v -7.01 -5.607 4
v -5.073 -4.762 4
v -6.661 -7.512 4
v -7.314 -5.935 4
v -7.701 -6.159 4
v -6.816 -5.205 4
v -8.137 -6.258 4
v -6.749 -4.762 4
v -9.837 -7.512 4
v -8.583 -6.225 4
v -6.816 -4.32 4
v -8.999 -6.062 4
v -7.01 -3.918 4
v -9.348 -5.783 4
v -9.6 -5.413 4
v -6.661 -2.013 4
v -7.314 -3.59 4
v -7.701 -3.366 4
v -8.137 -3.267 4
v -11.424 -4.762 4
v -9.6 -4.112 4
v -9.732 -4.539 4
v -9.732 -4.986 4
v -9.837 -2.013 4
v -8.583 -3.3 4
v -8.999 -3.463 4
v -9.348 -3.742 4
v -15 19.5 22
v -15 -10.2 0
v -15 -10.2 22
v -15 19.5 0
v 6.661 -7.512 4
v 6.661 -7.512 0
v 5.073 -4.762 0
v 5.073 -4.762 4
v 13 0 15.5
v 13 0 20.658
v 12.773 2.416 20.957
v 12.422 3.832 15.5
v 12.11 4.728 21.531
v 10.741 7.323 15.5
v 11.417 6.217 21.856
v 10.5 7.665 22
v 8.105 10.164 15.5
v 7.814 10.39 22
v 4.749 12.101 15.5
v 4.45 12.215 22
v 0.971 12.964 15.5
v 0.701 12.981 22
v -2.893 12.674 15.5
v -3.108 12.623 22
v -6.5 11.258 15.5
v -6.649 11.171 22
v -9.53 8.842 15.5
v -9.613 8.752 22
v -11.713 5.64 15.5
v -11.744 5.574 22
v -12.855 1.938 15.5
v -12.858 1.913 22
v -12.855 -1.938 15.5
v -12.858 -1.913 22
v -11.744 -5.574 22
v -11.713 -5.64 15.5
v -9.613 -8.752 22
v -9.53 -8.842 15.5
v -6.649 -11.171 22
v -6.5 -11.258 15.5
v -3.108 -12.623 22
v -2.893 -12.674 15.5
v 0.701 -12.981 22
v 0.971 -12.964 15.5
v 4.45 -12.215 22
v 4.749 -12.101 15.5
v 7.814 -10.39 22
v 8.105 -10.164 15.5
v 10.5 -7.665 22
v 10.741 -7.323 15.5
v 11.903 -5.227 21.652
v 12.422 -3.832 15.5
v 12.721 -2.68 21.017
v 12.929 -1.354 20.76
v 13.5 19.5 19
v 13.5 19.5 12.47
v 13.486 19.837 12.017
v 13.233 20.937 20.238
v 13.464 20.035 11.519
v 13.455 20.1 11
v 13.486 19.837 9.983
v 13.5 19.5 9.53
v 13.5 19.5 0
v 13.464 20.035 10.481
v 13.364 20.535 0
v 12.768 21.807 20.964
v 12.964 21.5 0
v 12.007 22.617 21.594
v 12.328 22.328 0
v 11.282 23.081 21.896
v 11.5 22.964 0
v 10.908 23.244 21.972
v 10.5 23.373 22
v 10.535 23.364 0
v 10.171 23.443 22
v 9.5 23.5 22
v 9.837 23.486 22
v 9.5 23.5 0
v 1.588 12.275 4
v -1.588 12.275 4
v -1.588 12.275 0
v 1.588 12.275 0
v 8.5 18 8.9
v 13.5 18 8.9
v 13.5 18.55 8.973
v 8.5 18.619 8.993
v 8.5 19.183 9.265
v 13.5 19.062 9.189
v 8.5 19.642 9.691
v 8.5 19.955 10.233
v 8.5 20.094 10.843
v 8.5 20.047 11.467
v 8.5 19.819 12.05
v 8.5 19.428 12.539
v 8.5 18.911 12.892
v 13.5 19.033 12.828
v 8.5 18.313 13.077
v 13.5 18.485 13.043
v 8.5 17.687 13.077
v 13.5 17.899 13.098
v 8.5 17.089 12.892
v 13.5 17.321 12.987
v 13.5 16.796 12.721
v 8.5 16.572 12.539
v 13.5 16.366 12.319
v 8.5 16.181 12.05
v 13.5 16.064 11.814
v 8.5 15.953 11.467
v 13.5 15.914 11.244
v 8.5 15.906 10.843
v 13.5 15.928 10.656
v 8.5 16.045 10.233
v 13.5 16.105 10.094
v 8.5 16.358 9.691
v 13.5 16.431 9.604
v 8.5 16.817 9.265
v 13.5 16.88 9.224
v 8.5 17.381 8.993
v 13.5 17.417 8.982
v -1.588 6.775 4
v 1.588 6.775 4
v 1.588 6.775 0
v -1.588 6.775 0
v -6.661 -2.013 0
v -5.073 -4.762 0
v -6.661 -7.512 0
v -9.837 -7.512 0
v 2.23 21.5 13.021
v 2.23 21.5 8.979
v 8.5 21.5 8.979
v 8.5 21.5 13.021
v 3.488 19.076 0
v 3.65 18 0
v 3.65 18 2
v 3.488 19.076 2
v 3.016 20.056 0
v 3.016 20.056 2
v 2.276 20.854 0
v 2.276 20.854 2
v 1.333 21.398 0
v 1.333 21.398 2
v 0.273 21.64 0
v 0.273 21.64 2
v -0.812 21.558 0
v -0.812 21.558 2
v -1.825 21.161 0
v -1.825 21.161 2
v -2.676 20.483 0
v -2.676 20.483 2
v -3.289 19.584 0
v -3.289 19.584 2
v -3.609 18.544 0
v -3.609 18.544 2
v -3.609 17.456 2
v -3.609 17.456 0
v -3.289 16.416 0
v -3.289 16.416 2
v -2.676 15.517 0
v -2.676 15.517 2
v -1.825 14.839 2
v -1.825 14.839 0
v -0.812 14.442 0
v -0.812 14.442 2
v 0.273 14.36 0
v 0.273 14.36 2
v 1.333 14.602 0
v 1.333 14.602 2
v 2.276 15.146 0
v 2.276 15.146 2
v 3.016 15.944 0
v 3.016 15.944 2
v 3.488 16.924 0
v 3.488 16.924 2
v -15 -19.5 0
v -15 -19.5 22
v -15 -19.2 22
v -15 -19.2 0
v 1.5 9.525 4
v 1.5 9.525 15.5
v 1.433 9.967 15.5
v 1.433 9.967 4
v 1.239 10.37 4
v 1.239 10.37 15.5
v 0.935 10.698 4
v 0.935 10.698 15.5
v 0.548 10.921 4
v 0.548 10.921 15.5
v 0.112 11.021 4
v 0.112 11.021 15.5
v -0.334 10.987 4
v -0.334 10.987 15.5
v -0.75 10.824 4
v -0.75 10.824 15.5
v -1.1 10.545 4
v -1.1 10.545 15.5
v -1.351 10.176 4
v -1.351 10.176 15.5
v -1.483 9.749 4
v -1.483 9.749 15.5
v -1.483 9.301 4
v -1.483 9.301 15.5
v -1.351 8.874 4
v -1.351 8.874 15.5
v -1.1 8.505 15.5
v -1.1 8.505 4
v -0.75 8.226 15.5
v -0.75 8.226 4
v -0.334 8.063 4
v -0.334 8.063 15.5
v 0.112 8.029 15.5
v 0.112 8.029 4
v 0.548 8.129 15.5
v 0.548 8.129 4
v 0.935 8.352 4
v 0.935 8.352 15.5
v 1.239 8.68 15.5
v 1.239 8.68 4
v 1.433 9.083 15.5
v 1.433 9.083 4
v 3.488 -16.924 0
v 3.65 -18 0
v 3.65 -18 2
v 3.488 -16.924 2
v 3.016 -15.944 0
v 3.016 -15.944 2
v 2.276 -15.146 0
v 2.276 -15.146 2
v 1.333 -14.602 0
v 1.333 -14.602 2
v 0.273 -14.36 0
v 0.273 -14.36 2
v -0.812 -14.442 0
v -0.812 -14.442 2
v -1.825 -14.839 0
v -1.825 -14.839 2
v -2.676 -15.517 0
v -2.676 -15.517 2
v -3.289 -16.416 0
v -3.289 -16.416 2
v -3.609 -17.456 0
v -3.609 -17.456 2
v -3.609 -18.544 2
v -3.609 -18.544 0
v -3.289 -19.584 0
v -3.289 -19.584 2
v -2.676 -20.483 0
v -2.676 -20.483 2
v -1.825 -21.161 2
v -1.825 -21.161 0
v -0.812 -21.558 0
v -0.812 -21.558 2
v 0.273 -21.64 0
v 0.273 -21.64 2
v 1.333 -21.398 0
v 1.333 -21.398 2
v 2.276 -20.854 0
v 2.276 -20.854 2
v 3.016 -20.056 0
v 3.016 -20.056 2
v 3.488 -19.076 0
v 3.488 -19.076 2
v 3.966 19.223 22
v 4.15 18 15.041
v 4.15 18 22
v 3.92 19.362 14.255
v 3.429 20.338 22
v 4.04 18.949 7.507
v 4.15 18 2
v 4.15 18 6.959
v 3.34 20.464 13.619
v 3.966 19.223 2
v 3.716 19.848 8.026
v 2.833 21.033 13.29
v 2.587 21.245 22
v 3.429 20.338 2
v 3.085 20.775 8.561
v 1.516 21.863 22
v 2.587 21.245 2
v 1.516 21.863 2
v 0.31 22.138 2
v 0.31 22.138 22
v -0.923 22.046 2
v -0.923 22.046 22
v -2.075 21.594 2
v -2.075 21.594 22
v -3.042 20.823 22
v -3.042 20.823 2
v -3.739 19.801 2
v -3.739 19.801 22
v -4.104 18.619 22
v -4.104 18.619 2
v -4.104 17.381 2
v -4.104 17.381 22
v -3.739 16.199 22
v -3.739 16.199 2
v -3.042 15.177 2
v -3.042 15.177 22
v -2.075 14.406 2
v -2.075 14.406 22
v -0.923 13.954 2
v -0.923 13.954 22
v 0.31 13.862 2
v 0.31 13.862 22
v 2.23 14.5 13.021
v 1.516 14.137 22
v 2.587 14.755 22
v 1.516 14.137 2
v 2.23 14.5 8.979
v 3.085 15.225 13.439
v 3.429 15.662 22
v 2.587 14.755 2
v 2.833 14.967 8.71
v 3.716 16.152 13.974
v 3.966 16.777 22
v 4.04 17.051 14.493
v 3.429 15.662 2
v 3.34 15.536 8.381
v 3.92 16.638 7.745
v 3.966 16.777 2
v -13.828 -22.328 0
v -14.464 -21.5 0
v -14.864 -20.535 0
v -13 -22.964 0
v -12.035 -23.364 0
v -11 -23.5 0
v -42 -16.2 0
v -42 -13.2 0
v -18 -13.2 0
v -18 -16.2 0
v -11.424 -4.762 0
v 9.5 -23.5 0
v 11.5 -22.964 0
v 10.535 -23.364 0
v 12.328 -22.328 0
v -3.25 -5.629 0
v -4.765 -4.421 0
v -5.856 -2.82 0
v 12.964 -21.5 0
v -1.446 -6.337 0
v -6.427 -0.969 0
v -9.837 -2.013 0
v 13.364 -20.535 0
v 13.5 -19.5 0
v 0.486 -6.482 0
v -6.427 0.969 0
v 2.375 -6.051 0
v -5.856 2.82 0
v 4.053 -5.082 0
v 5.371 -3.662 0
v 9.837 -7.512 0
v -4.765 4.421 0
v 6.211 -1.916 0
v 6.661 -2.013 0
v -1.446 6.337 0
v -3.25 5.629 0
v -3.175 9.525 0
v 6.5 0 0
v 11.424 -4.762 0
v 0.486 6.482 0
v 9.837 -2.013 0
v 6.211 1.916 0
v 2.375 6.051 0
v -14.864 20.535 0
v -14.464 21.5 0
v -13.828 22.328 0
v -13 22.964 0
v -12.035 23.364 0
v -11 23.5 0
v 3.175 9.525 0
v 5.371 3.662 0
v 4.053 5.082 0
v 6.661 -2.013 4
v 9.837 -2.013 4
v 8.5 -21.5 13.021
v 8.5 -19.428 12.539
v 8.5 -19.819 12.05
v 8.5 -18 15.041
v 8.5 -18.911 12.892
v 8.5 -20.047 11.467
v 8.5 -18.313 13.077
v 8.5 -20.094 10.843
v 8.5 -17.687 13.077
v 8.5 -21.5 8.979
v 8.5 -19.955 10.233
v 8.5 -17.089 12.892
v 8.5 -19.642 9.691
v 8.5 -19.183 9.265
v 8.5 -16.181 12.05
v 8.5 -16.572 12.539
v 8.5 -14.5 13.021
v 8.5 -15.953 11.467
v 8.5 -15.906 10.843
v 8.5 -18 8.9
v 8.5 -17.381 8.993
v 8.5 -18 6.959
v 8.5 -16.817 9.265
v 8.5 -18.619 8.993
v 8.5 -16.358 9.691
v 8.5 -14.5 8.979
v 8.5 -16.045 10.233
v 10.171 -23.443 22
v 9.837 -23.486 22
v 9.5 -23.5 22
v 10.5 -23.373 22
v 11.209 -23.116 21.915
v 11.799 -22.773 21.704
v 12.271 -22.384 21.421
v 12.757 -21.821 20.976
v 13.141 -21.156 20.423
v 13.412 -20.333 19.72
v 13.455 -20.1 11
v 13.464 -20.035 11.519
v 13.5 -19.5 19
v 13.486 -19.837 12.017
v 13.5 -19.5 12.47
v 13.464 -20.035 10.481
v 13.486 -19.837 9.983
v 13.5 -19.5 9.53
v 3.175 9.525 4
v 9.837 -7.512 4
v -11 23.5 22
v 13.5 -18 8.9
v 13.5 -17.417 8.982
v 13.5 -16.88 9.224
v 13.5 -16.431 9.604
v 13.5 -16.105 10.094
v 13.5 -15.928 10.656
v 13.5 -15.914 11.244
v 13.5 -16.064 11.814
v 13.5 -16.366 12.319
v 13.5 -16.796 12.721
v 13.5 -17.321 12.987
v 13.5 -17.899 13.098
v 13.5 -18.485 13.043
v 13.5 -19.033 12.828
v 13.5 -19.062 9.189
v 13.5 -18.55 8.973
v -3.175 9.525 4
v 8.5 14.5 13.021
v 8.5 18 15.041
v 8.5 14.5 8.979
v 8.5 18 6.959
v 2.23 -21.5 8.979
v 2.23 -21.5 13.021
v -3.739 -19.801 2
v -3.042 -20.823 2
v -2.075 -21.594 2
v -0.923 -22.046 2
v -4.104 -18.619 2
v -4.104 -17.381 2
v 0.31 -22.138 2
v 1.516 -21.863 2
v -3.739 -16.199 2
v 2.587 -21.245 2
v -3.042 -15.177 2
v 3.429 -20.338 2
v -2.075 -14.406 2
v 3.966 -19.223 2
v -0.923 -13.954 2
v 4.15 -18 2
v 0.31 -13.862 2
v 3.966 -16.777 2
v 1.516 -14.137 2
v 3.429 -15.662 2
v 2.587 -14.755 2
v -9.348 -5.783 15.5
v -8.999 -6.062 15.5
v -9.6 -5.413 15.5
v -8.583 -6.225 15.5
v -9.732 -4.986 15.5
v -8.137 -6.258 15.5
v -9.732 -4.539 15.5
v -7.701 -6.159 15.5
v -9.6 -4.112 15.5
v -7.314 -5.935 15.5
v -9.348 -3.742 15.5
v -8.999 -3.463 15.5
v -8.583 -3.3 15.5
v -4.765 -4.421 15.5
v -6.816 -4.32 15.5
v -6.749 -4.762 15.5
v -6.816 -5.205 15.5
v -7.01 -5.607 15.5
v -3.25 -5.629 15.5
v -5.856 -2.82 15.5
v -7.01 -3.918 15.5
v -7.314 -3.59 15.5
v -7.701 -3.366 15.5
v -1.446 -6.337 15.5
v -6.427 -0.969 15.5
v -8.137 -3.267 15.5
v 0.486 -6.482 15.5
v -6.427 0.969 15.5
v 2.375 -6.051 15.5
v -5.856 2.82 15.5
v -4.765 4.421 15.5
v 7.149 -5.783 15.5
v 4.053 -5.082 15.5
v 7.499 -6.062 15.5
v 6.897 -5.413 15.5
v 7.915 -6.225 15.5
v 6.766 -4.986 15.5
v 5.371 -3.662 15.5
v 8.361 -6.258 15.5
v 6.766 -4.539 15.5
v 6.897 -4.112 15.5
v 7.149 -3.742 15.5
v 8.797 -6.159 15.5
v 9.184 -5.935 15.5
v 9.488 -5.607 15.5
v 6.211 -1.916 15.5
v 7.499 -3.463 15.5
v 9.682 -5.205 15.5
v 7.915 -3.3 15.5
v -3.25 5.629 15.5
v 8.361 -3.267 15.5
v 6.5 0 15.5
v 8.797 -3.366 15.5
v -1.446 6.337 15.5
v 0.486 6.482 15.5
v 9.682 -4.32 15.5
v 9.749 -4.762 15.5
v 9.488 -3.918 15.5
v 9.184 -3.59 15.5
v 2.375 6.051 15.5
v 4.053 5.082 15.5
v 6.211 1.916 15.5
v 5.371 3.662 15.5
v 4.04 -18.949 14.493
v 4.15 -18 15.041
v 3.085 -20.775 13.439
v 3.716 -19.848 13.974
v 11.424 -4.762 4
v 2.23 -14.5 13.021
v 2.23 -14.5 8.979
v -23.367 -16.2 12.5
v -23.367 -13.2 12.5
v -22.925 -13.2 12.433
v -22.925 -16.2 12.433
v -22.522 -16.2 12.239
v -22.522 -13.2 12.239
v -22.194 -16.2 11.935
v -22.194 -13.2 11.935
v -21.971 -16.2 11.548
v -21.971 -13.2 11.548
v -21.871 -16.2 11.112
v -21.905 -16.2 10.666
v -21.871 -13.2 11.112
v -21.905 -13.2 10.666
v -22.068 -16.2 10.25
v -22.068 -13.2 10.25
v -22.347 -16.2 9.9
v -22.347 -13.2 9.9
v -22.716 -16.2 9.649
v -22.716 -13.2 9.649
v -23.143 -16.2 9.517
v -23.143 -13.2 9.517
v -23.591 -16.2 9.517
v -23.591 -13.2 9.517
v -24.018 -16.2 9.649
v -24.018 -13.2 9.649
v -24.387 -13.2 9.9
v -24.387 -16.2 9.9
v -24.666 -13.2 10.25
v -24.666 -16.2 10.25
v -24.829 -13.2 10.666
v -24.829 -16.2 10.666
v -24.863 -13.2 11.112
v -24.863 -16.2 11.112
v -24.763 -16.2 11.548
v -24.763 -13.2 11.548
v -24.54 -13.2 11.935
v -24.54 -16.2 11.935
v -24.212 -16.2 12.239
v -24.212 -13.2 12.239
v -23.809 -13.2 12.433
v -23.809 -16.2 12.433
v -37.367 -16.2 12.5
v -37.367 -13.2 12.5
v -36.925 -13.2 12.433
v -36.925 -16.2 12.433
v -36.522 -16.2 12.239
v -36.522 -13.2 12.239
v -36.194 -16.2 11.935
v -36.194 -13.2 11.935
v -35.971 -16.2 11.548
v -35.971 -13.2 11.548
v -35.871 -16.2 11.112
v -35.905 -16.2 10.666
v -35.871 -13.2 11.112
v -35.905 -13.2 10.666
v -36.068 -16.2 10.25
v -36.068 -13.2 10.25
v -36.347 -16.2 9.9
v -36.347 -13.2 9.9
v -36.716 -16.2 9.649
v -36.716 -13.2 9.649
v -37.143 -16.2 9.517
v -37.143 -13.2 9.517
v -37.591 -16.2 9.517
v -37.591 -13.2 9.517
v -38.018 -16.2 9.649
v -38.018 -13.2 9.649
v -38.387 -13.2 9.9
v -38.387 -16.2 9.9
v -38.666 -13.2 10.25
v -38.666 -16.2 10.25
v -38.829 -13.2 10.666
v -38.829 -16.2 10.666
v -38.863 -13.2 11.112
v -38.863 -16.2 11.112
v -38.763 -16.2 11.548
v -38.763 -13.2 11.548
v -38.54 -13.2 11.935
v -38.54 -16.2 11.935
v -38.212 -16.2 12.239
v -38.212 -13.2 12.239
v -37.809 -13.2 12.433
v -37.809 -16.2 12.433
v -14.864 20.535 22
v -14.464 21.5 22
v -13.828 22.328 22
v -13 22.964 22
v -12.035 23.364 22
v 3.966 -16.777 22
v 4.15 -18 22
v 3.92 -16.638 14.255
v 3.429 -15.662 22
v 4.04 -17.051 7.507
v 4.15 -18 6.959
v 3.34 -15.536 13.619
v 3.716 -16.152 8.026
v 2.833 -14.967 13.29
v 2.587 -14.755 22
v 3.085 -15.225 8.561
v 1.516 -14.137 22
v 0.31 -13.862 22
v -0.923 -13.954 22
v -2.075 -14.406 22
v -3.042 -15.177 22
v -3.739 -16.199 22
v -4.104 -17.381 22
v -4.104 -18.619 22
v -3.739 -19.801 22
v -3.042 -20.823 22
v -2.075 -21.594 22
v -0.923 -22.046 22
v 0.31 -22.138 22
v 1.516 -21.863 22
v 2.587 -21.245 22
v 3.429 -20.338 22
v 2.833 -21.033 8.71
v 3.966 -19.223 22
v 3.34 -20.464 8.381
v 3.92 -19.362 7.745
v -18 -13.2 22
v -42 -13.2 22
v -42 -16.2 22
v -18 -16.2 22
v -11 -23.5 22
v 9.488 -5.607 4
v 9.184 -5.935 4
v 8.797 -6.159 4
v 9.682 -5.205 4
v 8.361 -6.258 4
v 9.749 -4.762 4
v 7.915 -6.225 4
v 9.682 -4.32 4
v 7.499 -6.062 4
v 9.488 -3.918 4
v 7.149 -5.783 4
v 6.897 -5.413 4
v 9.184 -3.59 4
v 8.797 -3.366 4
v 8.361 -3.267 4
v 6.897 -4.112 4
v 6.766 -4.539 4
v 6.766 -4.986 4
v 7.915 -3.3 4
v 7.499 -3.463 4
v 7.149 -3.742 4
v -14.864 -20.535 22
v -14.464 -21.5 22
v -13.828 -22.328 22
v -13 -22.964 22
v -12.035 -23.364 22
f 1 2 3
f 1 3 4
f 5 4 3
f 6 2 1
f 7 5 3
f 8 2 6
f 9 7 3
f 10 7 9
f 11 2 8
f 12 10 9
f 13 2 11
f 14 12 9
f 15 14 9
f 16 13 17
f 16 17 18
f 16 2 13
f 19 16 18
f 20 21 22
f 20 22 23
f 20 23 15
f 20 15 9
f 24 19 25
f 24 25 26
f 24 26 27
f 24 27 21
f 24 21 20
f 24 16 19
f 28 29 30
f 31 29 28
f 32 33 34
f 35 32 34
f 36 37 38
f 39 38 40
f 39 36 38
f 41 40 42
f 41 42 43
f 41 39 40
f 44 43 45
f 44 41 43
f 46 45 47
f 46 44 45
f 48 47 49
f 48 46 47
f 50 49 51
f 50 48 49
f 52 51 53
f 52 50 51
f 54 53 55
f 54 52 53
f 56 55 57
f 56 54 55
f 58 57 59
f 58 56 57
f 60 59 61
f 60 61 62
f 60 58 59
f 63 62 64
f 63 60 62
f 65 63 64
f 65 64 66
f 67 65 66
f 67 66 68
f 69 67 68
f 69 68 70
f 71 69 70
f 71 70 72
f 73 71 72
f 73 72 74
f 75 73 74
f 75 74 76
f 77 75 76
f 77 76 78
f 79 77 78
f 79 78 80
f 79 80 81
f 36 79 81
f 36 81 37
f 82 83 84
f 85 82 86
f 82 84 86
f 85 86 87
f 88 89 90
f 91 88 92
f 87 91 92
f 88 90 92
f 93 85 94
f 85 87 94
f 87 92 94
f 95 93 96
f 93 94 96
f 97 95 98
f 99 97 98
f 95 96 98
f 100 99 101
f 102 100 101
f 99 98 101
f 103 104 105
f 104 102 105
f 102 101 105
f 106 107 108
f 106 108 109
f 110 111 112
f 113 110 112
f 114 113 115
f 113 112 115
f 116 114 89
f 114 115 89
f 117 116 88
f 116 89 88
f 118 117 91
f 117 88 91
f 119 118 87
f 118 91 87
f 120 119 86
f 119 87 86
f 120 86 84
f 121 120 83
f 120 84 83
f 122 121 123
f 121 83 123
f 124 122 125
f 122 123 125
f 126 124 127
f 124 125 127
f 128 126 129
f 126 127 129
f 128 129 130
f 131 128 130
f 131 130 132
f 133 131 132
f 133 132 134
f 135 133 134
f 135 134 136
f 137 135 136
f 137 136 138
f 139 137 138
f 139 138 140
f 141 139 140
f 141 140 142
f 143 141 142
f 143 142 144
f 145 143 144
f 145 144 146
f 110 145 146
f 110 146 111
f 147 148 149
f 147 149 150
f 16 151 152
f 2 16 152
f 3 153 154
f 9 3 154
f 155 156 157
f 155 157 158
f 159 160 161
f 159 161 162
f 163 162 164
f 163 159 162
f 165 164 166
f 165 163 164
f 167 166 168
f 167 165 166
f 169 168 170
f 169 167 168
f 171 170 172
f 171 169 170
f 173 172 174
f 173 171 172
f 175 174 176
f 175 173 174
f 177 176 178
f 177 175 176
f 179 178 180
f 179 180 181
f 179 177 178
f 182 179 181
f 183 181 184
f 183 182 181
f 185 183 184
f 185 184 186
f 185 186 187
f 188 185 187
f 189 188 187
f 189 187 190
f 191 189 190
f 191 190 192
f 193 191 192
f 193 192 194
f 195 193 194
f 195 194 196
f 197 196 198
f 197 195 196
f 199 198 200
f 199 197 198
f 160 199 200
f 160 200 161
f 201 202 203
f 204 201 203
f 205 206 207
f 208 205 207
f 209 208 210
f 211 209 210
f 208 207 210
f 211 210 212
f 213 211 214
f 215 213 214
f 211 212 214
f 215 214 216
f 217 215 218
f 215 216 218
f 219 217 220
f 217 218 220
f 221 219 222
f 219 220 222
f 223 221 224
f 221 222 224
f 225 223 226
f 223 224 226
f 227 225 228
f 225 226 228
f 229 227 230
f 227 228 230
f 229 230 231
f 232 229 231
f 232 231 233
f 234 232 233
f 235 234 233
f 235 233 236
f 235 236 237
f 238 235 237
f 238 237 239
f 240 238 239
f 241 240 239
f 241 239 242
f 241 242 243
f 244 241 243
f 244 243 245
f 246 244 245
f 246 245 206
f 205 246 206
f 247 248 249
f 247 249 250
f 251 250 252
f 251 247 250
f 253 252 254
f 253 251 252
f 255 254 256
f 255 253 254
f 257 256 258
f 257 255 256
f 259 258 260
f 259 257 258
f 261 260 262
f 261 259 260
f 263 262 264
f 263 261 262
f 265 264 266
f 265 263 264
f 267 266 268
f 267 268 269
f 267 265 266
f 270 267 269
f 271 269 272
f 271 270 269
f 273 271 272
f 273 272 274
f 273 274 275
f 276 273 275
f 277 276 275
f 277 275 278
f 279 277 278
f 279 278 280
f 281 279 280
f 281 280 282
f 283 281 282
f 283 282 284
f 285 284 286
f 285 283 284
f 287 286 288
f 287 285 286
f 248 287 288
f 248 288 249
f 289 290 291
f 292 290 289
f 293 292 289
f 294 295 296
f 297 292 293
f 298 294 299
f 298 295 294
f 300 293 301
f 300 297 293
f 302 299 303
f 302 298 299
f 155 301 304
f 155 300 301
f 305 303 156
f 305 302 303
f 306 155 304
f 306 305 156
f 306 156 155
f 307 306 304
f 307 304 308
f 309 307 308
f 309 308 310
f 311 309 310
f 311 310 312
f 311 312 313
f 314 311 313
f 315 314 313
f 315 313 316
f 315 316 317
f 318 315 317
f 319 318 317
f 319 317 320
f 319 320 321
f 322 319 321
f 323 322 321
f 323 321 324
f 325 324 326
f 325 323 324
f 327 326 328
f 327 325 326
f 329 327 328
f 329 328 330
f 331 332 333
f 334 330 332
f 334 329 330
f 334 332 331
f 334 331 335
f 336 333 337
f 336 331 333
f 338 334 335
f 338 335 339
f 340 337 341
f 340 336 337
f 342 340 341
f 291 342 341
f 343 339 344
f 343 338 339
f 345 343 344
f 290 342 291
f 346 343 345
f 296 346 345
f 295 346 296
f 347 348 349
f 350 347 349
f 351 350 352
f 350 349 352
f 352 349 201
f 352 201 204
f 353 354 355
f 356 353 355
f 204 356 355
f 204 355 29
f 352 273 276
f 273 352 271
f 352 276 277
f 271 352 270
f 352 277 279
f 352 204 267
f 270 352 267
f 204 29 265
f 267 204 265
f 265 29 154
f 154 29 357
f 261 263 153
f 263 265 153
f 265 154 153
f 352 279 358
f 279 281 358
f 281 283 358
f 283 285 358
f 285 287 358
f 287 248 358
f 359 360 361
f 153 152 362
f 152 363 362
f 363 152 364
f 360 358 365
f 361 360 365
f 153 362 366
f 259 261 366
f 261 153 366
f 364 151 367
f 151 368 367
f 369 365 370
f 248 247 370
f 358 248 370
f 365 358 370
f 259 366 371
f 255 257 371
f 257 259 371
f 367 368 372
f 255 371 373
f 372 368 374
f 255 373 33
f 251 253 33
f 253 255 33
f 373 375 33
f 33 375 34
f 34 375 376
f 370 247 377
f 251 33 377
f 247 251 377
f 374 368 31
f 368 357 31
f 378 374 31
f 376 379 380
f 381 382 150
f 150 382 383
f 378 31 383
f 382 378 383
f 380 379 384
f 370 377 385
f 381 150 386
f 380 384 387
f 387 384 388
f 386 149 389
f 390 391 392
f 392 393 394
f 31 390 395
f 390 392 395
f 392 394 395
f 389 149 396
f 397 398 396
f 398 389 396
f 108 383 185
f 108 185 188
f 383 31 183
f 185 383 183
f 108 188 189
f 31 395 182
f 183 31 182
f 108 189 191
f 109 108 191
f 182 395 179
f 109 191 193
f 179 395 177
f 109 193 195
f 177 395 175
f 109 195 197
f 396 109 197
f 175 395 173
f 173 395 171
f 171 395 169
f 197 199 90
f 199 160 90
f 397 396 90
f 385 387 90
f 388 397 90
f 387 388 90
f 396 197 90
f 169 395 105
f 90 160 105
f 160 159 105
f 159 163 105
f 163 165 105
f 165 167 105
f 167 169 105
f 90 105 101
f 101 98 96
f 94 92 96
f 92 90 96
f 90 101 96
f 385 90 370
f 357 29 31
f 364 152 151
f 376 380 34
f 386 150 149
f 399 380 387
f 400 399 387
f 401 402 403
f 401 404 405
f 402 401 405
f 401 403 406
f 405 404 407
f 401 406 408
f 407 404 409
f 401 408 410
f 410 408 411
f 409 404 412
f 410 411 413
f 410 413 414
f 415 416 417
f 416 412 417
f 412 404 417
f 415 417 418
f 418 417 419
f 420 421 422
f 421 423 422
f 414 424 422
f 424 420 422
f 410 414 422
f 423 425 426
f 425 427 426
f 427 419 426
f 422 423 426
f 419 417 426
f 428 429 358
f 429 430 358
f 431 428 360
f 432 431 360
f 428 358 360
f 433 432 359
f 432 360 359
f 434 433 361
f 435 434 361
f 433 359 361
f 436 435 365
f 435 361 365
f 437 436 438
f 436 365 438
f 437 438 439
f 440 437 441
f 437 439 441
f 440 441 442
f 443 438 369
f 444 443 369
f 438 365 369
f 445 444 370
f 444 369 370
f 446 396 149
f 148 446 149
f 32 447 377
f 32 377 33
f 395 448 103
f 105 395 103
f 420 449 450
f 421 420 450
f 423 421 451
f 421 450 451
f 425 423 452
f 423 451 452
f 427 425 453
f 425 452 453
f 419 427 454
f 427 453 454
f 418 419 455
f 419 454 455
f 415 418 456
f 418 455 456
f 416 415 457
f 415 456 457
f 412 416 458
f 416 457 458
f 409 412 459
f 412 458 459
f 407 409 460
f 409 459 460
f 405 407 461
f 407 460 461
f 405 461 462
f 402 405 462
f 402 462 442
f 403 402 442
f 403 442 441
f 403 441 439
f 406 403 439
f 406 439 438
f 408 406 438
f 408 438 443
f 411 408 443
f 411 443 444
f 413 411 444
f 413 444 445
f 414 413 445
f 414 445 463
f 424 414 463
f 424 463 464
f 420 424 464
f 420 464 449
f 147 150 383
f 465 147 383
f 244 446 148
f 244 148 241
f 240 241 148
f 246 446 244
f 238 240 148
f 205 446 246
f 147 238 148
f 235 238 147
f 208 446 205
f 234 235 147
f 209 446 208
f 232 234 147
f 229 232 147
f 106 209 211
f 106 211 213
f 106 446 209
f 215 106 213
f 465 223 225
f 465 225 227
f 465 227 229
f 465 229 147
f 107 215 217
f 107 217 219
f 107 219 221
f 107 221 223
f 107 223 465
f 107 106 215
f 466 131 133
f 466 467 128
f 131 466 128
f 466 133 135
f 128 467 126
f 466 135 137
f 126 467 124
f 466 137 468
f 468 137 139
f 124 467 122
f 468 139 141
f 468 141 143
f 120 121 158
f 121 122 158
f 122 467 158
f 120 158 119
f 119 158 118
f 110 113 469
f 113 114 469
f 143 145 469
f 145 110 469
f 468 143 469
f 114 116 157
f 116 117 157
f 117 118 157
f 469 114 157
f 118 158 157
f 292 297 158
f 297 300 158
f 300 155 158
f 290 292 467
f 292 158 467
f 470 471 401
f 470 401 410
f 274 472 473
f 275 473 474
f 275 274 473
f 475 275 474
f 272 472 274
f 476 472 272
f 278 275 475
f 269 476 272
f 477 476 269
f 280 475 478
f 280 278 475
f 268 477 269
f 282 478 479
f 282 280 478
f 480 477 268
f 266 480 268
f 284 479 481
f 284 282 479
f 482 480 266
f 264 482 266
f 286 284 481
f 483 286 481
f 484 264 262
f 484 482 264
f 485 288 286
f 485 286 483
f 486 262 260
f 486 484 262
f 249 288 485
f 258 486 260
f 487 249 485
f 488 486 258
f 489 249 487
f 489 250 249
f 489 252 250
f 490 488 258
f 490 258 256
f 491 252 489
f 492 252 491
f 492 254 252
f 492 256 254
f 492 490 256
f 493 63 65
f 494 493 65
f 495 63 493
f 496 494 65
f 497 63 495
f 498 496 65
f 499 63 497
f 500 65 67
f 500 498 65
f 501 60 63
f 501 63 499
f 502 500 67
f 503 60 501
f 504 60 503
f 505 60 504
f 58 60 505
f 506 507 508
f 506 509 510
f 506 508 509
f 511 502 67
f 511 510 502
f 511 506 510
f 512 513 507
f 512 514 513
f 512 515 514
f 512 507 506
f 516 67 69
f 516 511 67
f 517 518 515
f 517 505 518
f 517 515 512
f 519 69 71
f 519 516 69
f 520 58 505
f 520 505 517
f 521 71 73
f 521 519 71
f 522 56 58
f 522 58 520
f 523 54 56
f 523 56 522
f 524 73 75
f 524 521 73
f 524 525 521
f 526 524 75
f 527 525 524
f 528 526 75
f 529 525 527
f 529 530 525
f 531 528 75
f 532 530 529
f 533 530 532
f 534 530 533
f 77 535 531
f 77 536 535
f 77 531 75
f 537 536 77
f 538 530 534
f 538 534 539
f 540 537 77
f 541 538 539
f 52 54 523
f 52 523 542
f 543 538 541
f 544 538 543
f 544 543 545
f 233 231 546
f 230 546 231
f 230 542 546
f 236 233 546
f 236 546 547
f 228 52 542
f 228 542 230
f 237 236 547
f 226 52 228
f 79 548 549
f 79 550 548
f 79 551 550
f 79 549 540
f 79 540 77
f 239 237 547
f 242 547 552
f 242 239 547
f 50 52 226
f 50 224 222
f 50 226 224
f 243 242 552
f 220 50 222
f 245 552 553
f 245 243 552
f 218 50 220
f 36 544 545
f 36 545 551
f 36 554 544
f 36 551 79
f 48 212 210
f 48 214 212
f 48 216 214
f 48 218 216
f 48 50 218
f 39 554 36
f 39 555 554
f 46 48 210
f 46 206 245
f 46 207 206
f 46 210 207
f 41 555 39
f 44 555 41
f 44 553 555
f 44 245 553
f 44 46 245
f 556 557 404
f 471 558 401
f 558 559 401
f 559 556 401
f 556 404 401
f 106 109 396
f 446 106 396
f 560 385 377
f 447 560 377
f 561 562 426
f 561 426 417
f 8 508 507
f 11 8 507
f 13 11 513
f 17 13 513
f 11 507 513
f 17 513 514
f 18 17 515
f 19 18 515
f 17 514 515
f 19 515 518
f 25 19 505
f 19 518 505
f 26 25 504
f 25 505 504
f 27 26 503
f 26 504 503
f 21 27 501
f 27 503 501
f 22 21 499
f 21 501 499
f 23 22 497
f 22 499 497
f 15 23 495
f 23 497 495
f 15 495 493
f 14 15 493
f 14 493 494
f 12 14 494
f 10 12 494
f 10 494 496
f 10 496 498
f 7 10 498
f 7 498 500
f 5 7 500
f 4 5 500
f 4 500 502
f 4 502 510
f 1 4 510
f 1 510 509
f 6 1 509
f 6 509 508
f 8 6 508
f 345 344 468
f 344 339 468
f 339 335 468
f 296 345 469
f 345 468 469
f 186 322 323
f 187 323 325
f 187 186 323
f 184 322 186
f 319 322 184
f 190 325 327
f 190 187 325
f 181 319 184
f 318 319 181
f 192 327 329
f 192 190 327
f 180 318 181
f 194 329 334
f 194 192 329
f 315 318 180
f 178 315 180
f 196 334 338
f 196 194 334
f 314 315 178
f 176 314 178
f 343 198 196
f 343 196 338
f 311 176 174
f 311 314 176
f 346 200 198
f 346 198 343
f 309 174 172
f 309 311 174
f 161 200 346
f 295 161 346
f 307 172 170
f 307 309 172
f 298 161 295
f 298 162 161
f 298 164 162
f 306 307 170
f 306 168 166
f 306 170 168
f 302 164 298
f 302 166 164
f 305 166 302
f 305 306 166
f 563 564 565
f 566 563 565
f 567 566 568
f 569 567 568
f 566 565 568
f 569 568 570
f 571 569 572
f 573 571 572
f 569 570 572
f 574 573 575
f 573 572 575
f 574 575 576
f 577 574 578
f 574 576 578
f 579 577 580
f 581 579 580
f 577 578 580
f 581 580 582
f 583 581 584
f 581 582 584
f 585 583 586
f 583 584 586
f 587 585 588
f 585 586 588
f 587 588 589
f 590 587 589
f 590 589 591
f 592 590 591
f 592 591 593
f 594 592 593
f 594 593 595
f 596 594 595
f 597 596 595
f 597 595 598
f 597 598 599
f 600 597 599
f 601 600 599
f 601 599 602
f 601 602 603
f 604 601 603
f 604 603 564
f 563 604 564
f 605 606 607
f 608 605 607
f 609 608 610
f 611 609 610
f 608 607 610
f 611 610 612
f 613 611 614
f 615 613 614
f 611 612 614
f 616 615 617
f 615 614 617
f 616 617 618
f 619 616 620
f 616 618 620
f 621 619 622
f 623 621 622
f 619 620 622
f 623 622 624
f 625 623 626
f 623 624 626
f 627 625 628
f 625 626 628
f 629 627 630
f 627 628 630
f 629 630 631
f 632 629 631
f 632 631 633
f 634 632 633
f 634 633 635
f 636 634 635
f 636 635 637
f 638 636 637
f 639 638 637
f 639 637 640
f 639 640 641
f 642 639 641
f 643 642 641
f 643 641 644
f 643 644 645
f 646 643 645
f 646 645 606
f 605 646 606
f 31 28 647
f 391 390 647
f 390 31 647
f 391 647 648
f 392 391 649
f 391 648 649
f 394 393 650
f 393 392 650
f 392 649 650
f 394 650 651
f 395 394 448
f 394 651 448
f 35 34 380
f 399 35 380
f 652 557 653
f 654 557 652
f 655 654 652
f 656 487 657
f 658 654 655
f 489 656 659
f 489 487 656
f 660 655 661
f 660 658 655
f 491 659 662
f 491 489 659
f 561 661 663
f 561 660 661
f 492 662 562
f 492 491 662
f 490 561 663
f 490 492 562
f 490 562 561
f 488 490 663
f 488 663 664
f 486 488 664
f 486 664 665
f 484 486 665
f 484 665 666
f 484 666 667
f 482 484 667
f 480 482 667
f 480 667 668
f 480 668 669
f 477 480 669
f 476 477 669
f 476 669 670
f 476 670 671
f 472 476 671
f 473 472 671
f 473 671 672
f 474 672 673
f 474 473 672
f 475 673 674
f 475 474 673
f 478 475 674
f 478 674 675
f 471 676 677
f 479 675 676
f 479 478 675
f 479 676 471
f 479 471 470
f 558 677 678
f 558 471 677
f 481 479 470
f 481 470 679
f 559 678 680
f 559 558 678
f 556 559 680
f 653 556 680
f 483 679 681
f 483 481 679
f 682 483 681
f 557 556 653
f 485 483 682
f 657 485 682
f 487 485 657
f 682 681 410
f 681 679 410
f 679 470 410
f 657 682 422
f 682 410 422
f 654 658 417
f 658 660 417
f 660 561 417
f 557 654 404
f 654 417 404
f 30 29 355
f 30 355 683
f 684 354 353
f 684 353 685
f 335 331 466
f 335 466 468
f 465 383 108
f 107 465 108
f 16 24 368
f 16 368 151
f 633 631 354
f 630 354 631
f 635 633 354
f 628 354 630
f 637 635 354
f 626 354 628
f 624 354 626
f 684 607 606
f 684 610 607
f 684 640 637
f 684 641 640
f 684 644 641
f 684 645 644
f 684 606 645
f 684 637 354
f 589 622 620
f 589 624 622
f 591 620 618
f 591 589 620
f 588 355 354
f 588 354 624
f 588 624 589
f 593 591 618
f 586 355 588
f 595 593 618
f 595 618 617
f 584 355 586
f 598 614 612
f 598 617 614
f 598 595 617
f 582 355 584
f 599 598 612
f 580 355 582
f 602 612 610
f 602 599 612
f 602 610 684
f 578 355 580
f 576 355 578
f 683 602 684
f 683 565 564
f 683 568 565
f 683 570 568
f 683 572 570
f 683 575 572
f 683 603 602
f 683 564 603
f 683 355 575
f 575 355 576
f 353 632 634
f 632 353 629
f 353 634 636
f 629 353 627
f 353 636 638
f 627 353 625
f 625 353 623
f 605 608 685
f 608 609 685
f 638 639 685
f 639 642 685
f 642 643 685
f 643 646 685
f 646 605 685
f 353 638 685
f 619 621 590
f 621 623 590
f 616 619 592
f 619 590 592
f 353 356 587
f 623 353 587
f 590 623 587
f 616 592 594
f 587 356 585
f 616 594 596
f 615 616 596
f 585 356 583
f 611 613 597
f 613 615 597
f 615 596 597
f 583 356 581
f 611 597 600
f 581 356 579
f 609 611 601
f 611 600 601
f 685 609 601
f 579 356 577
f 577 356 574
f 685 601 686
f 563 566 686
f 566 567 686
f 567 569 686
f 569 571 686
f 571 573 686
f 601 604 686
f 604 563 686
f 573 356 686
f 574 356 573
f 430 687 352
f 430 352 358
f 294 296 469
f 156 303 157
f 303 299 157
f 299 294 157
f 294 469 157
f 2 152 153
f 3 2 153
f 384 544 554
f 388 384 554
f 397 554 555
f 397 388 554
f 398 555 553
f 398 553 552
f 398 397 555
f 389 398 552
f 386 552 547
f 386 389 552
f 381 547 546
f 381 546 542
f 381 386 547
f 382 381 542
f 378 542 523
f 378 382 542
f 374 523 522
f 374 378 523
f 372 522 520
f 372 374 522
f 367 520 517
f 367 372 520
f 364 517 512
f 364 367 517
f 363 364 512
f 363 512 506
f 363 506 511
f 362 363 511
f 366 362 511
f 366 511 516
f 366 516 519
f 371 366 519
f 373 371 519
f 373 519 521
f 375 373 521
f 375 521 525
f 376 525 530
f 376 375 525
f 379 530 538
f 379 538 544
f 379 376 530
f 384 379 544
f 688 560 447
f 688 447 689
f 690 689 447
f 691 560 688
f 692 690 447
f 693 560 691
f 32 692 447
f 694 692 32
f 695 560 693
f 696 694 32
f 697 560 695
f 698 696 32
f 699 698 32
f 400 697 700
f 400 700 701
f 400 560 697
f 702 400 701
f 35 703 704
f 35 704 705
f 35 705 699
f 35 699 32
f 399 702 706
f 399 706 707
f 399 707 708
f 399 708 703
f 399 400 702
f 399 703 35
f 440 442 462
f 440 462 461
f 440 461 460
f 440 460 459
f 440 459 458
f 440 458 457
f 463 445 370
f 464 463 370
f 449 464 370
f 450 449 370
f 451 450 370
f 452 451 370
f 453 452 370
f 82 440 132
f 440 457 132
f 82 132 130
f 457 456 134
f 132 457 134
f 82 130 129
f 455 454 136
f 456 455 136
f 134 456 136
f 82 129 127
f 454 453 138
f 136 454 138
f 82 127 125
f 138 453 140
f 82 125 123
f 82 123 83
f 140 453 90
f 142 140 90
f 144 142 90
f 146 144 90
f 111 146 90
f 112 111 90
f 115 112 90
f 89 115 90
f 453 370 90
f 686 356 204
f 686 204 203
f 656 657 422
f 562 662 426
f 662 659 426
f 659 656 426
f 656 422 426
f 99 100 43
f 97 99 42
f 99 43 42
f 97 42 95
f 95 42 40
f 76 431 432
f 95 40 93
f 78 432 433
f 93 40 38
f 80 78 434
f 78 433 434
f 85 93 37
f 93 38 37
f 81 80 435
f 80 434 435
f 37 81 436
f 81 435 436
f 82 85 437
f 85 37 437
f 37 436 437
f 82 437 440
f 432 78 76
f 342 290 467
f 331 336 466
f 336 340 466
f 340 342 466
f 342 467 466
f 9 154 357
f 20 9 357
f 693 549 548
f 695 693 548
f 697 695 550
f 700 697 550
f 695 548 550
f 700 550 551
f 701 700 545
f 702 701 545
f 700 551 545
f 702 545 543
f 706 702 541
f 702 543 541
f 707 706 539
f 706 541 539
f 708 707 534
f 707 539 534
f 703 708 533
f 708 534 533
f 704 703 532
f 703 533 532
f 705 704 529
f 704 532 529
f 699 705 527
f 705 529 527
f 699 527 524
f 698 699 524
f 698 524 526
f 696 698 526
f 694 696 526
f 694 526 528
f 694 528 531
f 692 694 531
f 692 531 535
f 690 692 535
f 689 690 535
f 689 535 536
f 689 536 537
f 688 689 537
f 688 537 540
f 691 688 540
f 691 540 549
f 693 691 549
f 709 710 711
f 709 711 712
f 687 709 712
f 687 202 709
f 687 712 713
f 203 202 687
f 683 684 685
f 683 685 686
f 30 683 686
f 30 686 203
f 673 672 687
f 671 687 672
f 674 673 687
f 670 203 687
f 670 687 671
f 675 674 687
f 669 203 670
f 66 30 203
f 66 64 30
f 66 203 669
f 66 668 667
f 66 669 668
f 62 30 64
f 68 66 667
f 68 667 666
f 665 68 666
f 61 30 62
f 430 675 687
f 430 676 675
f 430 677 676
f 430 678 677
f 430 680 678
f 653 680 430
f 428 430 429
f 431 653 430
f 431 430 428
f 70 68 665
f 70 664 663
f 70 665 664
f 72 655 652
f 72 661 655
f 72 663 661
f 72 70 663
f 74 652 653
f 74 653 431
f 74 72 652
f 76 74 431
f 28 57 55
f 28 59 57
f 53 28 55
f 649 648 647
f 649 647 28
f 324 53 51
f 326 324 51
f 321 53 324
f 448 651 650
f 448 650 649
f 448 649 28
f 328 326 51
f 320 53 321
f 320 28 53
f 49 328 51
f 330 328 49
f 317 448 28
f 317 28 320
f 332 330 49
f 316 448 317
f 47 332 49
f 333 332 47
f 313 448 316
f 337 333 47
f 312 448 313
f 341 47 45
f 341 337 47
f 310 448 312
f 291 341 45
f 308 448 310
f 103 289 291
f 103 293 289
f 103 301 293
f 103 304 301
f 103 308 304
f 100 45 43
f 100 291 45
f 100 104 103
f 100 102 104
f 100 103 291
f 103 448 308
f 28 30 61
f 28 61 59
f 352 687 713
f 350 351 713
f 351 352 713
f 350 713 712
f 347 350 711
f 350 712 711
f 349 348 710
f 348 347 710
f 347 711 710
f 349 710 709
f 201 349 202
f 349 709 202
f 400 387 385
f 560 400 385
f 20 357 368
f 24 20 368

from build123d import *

# Parameters (mm, degrees)
SKETCH1_W           = 28.5
SKETCH1_H           = 47
SKETCH1_R           = 3.65
SKETCH1_R_2         = 13
BOSS_EXTRUDE1_DEPTH = 2
SKETCH1_3_W         = 28.5
SKETCH1_3_H         = 47
SKETCH1_3_R         = 4.15
SKETCH1_3_R_2       = 13
BOSS_EXTRUDE2_DEPTH = 22
SKETCH2_W           = 22
SKETCH2_H           = 3
BOSS_EXTRUDE3_DEPTH = 27
SKETCH1_4_R         = 13
SKETCH1_4_R_2       = 6.5
BOSS_EXTRUDE4_DEPTH = 15.5
SKETCH3_R           = 1.5
CUT_EXTRUDE1_DEPTH  = 51.561843321
CUT_EXTRUDE3_REACH  = 66.16
SKETCH5_R           = 2.1
CUT_EXTRUDE4_REACH  = 71.16
CUT_EXTRUDE4_START  = -5
SKETCH5_3_R         = 2.1
CUT_EXTRUDE5_REACH  = 61.957
SKETCH6_R           = 1.5
CHAMFER1_SIZE       = 3
FILLET1_R           = 4
FILLET2_R           = 3
CUT_EXTRUDE6_DEPTH  = 4


with BuildPart() as part:
    # Sketch1 → Boss-Extrude1 (new body)
    with BuildSketch(Plane.XY):
        with Locations((-0.75, 0)):
            Rectangle(SKETCH1_W, SKETCH1_H)
        with Locations((0, 18)):
            Circle(SKETCH1_R, mode=Mode.SUBTRACT)
        with Locations((0, -18)):
            Circle(SKETCH1_R, mode=Mode.SUBTRACT)
        Circle(SKETCH1_R_2, mode=Mode.SUBTRACT)
    extrude(amount=BOSS_EXTRUDE1_DEPTH)

    # Sketch1<3> → Boss-Extrude2 (add)
    with BuildSketch(Plane.XY):
        with Locations((-0.75, 0)):
            Rectangle(SKETCH1_3_W, SKETCH1_3_H)
        with Locations((0, 18)):
            Circle(SKETCH1_3_R, mode=Mode.SUBTRACT)
        with Locations((0, -18)):
            Circle(SKETCH1_3_R, mode=Mode.SUBTRACT)
        Circle(SKETCH1_3_R_2, mode=Mode.SUBTRACT)
    extrude(amount=BOSS_EXTRUDE2_DEPTH)

    # Sketch2 → Boss-Extrude3 (add)
    with BuildSketch(Plane.ZY.offset(15)):
        with Locations((11, -14.7)):
            Rectangle(SKETCH2_W, SKETCH2_H)
    extrude(amount=BOSS_EXTRUDE3_DEPTH)

    # Sketch1<4> → Boss-Extrude4 (add)
    with BuildSketch(Plane.XY):
        Circle(SKETCH1_4_R)
        Circle(SKETCH1_4_R_2, mode=Mode.SUBTRACT)
    extrude(amount=BOSS_EXTRUDE4_DEPTH)

    # Sketch3 → Cut-Extrude1 (cut, through all)
    with BuildSketch(Plane.XY.offset(15.5)):
        with Locations((0, 9.525)):
            Circle(SKETCH3_R)
        with Locations((8.248891971, -4.7625)):
            Circle(SKETCH3_R)
        with Locations((-8.248891971, -4.7625)):
            Circle(SKETCH3_R)
    extrude(amount=-CUT_EXTRUDE1_DEPTH, mode=Mode.SUBTRACT)

    # Sketch5 → Cut-Extrude3 (cut, up to next)
    with BuildSketch(Plane(origin=(13.5, 0, 0), x_dir=(0, 0, -1), z_dir=(1, 0, 0)), mode=Mode.PRIVATE) as cut_extrude3_sk1:
        with Locations((-11, 18)):
            Circle(SKETCH5_R)
    cut_extrude3_tool1 = extrude(cut_extrude3_sk1.sketch, amount=-CUT_EXTRUDE3_REACH, mode=Mode.PRIVATE) & part.part
    # Sketch5 → Cut-Extrude3 (cut, up to next)
    with BuildSketch(Plane(origin=(13.5, 0, 0), x_dir=(0, 0, -1), z_dir=(1, 0, 0)), mode=Mode.PRIVATE) as cut_extrude3_sk2:
        with Locations((-11, -18)):
            Circle(SKETCH5_R)
    cut_extrude3_tool2 = extrude(cut_extrude3_sk2.sketch, amount=-CUT_EXTRUDE3_REACH, mode=Mode.PRIVATE) & part.part
    add(cut_extrude3_tool1.solids().sort_by_distance((13.5, 18, 11))[0], mode=Mode.SUBTRACT)
    add(cut_extrude3_tool2.solids().sort_by_distance((13.5, -18, 11))[0], mode=Mode.SUBTRACT)

    # Sketch5<3> → Cut-Extrude4 (cut, up to next)
    with BuildSketch(Plane(origin=(13.5, 0, 0), x_dir=(0, 0, -1), z_dir=(1, 0, 0)).offset(CUT_EXTRUDE4_START), mode=Mode.PRIVATE) as cut_extrude4_sk1:
        Polygon((-6.958548116, 18), (-8.979274058, 21.5), (-13.020725942, 21.5), (-15.041451884, 18), (-13.020725942, 14.5), (-8.979274058, 14.5), align=None)
        with Locations((-11, 18)):
            Circle(SKETCH5_3_R, mode=Mode.SUBTRACT)
    cut_extrude4_tool1 = extrude(cut_extrude4_sk1.sketch, amount=-CUT_EXTRUDE4_REACH, mode=Mode.PRIVATE) & part.part
    # Sketch5<3> → Cut-Extrude4 (cut, up to next)
    with BuildSketch(Plane(origin=(13.5, 0, 0), x_dir=(0, 0, -1), z_dir=(1, 0, 0)).offset(CUT_EXTRUDE4_START), mode=Mode.PRIVATE) as cut_extrude4_sk2:
        Polygon((-6.958548116, -18), (-8.979274058, -14.5), (-13.020725942, -14.5), (-15.041451884, -18), (-13.020725942, -21.5), (-8.979274058, -21.5), align=None)
        with Locations((-11, -18)):
            Circle(SKETCH5_3_R, mode=Mode.SUBTRACT)
    cut_extrude4_tool2 = extrude(cut_extrude4_sk2.sketch, amount=-CUT_EXTRUDE4_REACH, mode=Mode.PRIVATE) & part.part
    add(cut_extrude4_tool1.solids().sort_by_distance((8.5, 19.696537, 8.061512))[0], mode=Mode.SUBTRACT)
    add(cut_extrude4_tool2.solids().sort_by_distance((8.5, -16.303463, 8.061512))[0], mode=Mode.SUBTRACT)

    # Sketch6 → Cut-Extrude5 (cut, up to next)
    with BuildSketch(Plane(origin=(0, -13.2, 0), x_dir=(1, 0, 0), z_dir=(0, 1, 0)), mode=Mode.PRIVATE) as cut_extrude5_sk1:
        with Locations(Location((-37.367, -11, 0), (0, 0, 270))):
            Circle(SKETCH6_R)
    cut_extrude5_tool1 = extrude(cut_extrude5_sk1.sketch, amount=-CUT_EXTRUDE5_REACH, mode=Mode.PRIVATE) & part.part
    # Sketch6 → Cut-Extrude5 (cut, up to next)
    with BuildSketch(Plane(origin=(0, -13.2, 0), x_dir=(1, 0, 0), z_dir=(0, 1, 0)), mode=Mode.PRIVATE) as cut_extrude5_sk2:
        with Locations(Location((-23.367, -11, 0), (0, 0, 270))):
            Circle(SKETCH6_R)
    cut_extrude5_tool2 = extrude(cut_extrude5_sk2.sketch, amount=-CUT_EXTRUDE5_REACH, mode=Mode.PRIVATE) & part.part
    add(cut_extrude5_tool1.solids().sort_by_distance((-37.367, -13.2, 11))[0], mode=Mode.SUBTRACT)
    add(cut_extrude5_tool2.solids().sort_by_distance((-23.367, -13.2, 11))[0], mode=Mode.SUBTRACT)

    # Chamfer1
    chamfer1_edges = [part.edges().sort_by_distance(p)[0] for p in [
        (-15, -16.2, 11),
        (-15, -13.2, 11),
    ]]
    chamfer(chamfer1_edges, length=CHAMFER1_SIZE)

    # Fillet1
    # the kernel refuses this fillet: 4 mm, written as the material it takes off along each edge
    with BuildSketch(Plane(origin=(-15, -23.5, 32), x_dir=(0, 1, 0), z_dir=(0, 0, -1)), Plane(origin=(-15, 23.5, 32), x_dir=(1, 0, 0), z_dir=(0, 0, -1))) as fillet1_piece_1:
        with BuildLine():
            CenterArc((FILLET1_R, FILLET1_R), FILLET1_R, 180, 90)
            Line((0, FILLET1_R), (0, 0))
            Line((0, 0), (FILLET1_R, 0))
        make_face()
    extrude(amount=42, mode=Mode.SUBTRACT)
    with BuildSketch(Plane(origin=(13.5, 23.5, -10), x_dir=(0, -1, 0), z_dir=(0, 0, 1)), Plane(origin=(13.5, -23.5, -10), x_dir=(-1, 0, 0), z_dir=(0, 0, 1))) as fillet1_piece_2:
        with BuildLine():
            CenterArc((FILLET1_R, -FILLET1_R), FILLET1_R, 90, 90)
            Line((0, -FILLET1_R), (0, 0))
            Line((0, 0), (FILLET1_R, 0))
        make_face()
    extrude(amount=42, mode=Mode.SUBTRACT)

    # Fillet2
    # the kernel refuses this fillet: 3 mm, written as the material it takes off along each edge
    with BuildSketch(Plane(origin=(13.5, -27, 22), x_dir=(-1, 0, 0), z_dir=(0, 1, 0))) as fillet2_piece_1:
        with BuildLine():
            CenterArc((FILLET2_R, -FILLET2_R), FILLET2_R, 90, 90)
            Line((0, -FILLET2_R), (0, 0))
            Line((0, 0), (FILLET2_R, 0))
        make_face()
    extrude(amount=54, mode=Mode.SUBTRACT)

    # Sketch7 → Cut-Extrude6 (cut)
    with BuildSketch(Plane(origin=(0, 0, 0), x_dir=(-1, 0, 0), z_dir=(0, 0, -1))):
        Polygon((1.58771324, 6.775), (3.175426481, 9.525), (1.58771324, 12.275), (-1.58771324, 12.275), (-3.175426481, 9.525), (-1.58771324, 6.775), align=None)
        Polygon((11.424318452, -4.7625), (9.836605211, -2.0125), (6.661178731, -2.0125), (5.073465491, -4.7625), (6.661178731, -7.5125), (9.836605211, -7.5125), align=None)
        Polygon((-9.836605211, -7.5125), (-6.661178731, -7.5125), (-5.073465491, -4.7625), (-6.661178731, -2.0125), (-9.836605211, -2.0125), (-11.424318452, -4.7625), align=None)
    extrude(amount=-CUT_EXTRUDE6_DEPTH, mode=Mode.SUBTRACT)


solid = part.part
